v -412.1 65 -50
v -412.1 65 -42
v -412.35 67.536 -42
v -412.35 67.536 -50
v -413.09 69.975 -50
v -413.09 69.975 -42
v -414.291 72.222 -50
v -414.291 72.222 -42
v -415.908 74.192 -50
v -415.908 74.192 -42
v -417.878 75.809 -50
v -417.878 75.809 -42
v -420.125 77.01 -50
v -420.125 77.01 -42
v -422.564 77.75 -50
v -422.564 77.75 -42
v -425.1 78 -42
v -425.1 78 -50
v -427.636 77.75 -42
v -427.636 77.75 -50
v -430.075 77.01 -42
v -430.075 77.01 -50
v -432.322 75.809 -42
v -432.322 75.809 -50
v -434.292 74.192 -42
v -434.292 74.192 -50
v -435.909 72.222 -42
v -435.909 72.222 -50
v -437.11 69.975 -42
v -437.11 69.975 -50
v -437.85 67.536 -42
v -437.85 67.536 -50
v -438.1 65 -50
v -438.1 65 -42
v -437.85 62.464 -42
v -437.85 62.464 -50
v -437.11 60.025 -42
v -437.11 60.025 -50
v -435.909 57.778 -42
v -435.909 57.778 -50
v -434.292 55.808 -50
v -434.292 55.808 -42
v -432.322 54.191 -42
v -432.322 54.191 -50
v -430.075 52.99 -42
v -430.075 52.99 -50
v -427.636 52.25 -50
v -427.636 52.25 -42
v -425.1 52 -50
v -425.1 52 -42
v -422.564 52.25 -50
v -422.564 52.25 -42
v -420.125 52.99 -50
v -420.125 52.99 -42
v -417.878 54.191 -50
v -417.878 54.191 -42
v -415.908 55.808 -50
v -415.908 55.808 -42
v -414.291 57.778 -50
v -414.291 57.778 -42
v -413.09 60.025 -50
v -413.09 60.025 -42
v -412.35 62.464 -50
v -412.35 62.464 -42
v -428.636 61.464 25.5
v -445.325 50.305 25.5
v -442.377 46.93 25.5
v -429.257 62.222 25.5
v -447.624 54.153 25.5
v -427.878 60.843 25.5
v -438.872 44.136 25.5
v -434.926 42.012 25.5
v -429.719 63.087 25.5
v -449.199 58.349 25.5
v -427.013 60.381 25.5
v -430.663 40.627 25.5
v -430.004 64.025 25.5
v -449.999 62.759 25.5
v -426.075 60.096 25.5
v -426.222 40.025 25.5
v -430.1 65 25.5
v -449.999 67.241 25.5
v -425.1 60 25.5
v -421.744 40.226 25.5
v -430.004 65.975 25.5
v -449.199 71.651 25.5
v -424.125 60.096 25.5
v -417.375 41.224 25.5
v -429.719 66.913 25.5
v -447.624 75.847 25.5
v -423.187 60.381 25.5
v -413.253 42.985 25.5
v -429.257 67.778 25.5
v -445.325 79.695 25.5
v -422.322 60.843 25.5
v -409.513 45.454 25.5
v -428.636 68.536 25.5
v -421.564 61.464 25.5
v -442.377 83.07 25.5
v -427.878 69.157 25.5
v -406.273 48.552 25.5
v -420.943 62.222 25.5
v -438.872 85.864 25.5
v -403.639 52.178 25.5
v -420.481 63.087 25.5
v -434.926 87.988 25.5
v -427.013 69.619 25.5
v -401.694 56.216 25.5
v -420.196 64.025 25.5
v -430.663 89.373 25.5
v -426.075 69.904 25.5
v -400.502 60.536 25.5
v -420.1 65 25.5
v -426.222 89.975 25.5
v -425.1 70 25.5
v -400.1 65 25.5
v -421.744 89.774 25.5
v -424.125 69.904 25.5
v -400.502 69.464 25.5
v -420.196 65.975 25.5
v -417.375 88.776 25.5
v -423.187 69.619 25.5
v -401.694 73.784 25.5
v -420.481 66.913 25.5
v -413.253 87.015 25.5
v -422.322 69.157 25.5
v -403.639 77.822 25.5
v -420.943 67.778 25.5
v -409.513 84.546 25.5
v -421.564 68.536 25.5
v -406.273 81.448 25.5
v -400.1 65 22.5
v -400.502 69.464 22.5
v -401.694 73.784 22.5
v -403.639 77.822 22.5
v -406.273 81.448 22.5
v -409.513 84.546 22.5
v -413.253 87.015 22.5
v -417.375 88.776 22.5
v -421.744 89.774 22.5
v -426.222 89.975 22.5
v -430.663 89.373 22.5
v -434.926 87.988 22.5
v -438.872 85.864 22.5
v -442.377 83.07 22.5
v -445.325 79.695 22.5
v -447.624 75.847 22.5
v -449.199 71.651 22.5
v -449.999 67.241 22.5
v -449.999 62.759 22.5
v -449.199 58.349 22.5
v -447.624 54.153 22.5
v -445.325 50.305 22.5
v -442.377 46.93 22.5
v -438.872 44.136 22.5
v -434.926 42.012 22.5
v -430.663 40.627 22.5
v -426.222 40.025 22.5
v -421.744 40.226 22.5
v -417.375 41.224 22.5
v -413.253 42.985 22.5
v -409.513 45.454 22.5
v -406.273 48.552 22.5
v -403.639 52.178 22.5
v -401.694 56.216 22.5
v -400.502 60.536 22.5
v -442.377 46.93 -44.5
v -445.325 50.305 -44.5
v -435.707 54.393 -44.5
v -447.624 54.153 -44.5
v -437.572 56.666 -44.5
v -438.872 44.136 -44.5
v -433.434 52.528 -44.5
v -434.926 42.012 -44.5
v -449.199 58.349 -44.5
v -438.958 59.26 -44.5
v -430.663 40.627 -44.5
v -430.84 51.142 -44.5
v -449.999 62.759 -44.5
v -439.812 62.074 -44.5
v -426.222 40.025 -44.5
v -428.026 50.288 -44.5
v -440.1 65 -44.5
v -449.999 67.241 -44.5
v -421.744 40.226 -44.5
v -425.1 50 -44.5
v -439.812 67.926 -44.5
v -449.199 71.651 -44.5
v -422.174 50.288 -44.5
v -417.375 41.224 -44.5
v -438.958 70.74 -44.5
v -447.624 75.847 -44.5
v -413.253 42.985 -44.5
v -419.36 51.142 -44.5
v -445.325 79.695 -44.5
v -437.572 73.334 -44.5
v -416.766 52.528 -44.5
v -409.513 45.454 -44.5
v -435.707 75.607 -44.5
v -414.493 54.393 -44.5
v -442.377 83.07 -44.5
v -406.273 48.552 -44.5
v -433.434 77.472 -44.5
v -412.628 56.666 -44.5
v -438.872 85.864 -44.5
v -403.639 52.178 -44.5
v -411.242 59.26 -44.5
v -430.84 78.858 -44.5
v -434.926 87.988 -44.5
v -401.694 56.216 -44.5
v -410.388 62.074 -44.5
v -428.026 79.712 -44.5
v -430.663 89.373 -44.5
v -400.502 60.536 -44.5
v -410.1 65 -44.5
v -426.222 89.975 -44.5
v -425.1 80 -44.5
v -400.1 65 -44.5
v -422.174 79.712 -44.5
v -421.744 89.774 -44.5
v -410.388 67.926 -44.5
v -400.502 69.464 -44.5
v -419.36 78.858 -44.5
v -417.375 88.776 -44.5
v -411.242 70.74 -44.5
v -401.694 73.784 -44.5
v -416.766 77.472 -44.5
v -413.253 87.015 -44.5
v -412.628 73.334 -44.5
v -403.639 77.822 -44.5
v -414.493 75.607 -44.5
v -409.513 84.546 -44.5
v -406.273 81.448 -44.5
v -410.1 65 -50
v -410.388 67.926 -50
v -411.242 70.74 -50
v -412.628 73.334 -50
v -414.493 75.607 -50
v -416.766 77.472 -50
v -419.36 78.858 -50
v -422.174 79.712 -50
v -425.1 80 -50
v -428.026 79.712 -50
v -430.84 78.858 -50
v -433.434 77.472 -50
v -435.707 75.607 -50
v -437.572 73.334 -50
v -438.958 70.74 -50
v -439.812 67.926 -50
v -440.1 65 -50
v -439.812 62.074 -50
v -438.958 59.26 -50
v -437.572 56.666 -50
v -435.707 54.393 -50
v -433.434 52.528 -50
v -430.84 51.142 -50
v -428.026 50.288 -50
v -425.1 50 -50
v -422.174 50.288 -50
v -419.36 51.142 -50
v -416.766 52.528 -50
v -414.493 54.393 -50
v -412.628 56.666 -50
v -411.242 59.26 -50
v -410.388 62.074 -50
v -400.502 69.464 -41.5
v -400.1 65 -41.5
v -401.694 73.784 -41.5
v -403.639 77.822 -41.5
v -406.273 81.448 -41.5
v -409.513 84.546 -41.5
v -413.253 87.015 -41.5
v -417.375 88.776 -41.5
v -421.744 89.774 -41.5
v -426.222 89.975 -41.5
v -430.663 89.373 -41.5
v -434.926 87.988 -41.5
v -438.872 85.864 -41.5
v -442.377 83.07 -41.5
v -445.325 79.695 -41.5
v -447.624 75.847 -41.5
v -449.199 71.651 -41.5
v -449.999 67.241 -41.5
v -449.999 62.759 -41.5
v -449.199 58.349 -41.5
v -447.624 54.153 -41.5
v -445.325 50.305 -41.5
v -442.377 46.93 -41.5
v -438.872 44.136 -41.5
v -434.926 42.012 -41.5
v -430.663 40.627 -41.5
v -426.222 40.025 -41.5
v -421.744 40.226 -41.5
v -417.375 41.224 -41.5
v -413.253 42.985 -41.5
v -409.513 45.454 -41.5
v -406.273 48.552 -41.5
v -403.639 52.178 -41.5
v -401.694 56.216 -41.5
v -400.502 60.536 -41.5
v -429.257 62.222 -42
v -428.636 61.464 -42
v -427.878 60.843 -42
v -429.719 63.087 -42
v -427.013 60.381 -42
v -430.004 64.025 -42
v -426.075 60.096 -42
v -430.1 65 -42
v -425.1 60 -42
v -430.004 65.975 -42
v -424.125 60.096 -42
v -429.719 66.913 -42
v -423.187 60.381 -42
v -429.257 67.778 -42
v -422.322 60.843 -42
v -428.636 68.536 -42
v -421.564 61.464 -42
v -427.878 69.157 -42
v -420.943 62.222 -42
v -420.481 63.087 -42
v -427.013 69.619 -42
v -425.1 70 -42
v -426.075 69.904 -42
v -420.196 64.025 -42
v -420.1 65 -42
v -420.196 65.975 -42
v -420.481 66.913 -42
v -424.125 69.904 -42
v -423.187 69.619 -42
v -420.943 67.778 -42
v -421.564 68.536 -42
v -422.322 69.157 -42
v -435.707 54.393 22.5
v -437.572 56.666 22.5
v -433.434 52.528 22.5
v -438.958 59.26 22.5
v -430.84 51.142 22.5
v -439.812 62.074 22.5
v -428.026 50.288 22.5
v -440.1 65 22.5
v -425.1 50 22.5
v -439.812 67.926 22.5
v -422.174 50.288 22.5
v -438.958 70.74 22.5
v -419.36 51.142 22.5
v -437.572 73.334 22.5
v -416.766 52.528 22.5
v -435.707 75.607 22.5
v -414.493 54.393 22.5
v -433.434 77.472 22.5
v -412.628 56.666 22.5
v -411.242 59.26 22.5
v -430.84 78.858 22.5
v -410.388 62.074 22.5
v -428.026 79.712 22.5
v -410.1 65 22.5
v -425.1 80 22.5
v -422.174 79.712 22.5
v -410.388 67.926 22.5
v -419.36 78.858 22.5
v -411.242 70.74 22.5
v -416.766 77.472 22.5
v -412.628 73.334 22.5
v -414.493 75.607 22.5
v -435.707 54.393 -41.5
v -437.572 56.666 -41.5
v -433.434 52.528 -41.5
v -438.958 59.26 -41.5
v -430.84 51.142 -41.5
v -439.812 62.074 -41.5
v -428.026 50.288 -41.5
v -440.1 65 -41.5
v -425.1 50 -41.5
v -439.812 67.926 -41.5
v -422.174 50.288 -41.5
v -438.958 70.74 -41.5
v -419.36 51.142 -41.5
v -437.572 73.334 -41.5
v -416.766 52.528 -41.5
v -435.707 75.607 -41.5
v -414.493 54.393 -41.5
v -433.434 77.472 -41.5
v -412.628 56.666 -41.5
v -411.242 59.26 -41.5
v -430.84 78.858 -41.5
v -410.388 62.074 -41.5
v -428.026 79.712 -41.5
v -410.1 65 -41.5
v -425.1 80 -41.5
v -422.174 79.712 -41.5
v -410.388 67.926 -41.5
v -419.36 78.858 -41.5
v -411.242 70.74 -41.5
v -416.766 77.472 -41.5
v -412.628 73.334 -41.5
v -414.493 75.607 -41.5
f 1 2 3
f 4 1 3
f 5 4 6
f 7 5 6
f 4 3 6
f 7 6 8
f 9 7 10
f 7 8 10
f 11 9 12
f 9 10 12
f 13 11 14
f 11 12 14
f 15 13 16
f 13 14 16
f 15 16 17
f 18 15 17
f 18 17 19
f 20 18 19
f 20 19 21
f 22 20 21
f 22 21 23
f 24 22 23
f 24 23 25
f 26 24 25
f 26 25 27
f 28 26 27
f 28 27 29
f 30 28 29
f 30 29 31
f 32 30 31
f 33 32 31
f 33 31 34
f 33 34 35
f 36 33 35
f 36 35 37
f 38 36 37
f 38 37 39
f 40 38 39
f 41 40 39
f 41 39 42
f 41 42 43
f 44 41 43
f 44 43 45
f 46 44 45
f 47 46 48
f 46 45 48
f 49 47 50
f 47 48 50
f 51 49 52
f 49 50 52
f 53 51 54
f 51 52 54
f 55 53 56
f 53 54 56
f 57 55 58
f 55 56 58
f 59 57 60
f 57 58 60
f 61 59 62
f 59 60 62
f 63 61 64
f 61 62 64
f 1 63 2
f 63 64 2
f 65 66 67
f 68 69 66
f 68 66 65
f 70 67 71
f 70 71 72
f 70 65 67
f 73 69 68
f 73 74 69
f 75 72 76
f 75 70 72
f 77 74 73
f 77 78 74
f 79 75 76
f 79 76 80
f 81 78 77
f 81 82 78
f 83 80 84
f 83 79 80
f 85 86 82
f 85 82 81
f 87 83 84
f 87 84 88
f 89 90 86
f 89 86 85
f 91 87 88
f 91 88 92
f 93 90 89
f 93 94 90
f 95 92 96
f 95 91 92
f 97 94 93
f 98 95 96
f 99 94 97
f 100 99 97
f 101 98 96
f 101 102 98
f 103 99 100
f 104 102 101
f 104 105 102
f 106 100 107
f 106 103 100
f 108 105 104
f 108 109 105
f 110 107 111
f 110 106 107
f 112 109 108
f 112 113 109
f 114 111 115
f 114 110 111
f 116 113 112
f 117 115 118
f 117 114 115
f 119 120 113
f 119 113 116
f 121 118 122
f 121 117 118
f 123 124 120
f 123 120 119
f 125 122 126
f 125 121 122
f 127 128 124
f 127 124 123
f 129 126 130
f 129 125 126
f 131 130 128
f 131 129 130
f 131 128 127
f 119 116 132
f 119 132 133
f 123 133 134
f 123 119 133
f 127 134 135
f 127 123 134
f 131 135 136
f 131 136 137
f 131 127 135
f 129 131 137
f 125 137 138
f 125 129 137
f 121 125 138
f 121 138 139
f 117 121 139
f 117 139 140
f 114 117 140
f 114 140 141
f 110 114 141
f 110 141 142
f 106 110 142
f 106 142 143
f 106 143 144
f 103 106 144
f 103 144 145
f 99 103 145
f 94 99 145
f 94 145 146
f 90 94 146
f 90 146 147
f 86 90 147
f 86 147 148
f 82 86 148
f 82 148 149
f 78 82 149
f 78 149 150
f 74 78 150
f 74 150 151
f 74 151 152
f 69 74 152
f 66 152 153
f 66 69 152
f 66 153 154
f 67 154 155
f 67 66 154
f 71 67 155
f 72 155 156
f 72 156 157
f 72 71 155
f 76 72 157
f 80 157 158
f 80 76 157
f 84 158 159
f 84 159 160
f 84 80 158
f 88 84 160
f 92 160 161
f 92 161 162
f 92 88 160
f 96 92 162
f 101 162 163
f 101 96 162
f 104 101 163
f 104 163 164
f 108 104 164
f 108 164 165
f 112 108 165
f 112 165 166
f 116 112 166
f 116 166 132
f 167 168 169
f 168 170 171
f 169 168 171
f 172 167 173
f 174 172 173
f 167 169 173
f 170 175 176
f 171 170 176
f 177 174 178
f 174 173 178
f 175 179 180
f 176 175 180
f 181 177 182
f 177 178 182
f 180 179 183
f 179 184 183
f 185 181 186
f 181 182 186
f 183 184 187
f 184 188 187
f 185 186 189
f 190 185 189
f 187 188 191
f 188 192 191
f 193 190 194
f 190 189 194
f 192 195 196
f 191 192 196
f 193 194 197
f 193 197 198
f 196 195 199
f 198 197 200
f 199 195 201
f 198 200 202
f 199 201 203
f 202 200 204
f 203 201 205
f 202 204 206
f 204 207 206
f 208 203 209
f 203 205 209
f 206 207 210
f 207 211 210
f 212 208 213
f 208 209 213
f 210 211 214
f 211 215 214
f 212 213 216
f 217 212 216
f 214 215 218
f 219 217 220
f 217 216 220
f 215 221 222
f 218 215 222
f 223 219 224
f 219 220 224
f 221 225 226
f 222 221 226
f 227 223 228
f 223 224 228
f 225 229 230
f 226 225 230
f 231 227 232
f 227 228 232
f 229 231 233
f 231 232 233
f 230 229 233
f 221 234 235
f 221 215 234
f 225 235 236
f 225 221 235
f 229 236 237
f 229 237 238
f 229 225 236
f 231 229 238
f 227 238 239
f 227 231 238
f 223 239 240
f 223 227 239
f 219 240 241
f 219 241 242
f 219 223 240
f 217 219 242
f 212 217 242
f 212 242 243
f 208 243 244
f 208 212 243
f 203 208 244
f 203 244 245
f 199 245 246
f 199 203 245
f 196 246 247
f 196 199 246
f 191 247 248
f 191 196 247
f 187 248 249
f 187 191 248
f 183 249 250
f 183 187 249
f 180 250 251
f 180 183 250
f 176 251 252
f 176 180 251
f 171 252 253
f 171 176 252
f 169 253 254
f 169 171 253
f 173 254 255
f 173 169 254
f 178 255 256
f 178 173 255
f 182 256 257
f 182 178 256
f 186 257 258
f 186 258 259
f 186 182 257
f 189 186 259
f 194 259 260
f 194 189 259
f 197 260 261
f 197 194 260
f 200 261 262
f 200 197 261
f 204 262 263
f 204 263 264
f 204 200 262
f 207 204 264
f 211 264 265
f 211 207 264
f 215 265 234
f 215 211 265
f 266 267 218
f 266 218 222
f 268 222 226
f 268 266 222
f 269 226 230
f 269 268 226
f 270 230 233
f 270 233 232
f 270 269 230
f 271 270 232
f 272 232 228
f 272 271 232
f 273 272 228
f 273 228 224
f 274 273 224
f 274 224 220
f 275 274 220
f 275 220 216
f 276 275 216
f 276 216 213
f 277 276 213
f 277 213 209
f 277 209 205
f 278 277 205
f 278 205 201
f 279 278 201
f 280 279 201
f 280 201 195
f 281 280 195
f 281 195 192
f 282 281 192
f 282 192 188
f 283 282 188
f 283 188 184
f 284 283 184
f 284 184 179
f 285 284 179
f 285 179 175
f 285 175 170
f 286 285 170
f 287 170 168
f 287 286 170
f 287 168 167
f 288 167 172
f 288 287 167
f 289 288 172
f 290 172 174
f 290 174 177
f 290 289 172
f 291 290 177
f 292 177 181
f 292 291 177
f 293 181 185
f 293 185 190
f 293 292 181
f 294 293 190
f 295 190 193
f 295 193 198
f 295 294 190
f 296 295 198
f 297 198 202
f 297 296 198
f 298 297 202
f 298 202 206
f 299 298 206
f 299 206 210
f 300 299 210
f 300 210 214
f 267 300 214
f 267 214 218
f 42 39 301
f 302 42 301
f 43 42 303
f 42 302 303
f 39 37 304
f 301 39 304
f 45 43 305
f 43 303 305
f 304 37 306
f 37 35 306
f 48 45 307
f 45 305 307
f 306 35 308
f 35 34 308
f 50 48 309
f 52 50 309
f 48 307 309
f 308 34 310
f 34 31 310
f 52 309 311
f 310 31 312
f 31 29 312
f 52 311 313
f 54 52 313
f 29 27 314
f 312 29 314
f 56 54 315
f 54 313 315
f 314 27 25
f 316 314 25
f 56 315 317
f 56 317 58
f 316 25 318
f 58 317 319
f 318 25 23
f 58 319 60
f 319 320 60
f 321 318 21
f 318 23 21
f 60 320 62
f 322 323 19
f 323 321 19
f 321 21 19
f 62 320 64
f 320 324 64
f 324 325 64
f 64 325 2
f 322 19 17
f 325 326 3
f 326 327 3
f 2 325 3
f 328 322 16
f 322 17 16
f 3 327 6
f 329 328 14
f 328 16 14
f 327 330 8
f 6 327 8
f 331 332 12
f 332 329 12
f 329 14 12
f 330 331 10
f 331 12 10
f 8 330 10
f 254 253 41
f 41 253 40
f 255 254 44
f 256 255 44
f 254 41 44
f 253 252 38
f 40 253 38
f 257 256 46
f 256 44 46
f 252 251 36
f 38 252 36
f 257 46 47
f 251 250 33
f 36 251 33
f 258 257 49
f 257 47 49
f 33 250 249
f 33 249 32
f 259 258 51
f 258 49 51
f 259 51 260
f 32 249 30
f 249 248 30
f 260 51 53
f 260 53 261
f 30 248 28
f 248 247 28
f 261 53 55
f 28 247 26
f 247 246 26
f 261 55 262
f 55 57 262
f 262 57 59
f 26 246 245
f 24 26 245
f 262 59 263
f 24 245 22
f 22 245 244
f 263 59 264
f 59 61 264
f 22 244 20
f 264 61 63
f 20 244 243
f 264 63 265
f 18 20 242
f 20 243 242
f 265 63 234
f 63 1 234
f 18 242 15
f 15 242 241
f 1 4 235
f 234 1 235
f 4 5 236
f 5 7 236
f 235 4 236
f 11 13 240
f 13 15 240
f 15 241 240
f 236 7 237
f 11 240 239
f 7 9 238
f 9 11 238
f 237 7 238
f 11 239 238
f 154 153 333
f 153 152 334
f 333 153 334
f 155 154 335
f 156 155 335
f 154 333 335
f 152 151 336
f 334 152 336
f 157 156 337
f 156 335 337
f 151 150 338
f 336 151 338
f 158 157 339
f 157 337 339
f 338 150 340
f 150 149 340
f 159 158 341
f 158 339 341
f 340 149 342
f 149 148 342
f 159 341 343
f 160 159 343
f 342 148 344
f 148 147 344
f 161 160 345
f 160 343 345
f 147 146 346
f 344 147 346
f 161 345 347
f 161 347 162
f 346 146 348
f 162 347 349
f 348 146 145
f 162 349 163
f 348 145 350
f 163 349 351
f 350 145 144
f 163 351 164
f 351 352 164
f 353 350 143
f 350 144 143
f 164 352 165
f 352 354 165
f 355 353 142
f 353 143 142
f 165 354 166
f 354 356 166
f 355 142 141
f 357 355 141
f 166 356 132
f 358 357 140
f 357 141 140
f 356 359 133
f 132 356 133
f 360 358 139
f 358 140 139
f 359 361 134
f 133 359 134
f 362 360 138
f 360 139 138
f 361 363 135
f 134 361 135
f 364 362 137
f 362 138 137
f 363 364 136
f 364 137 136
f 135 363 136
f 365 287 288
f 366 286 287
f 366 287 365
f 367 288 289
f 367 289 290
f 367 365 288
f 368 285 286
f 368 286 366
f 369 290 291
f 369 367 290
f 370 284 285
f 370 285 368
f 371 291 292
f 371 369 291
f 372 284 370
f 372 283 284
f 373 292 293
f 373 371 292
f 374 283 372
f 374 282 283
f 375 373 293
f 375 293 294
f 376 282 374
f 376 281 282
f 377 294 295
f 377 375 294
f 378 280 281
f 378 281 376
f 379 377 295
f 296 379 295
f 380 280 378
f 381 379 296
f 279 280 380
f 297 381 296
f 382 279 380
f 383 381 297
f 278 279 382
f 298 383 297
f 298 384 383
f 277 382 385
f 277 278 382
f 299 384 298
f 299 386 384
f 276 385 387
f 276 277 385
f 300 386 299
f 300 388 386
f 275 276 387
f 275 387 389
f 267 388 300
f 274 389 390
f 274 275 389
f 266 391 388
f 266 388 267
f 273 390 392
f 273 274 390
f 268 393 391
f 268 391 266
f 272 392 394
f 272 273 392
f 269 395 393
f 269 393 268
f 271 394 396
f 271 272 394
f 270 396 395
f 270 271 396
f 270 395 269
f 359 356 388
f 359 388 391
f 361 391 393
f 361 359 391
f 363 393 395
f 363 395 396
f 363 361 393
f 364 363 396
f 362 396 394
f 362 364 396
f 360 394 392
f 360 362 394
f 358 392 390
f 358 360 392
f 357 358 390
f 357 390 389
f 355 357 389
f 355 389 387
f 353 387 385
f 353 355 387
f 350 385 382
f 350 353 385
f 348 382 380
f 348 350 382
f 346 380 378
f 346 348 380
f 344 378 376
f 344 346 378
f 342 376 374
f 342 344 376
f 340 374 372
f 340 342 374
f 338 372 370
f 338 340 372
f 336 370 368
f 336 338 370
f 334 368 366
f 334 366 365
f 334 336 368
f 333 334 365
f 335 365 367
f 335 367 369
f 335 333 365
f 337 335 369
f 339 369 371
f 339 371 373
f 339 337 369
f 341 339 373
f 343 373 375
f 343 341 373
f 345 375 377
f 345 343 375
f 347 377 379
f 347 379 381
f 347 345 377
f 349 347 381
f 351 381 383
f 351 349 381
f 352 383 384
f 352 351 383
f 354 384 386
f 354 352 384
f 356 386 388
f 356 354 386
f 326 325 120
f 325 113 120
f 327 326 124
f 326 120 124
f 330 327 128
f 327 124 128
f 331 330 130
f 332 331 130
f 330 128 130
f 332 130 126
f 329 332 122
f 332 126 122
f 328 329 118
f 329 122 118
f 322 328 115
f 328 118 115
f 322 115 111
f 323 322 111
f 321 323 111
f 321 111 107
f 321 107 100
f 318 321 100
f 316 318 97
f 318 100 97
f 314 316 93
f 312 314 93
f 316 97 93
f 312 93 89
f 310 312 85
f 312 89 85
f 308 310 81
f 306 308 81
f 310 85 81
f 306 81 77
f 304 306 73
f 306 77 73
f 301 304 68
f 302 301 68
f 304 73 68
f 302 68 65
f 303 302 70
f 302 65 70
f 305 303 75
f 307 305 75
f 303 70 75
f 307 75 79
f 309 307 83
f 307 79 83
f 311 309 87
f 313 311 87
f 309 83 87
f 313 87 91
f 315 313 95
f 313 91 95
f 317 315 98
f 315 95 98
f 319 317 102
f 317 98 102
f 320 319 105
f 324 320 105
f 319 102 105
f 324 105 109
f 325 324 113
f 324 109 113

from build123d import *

# Parameters (mm, degrees)
CUERPO_PROFILE_R                     = 15
BRIDA_IZQ_PROFILE_R                  = 25
BRIDA_DCHA_PROFILE_R                 = 25
TALADRO_EJE_PROFILE_R                = 5
ALOJAMIENTO_RODAMIENTO_IZQ_PROFILE_R = 13


with BuildPart() as part:
    # Cuerpo: sweep along a curve in space
    with BuildLine() as cuerpo_path:
        Line((-425.1, 65, -50), (-425.1, 65, 25.5))
    # Cuerpo profile (on start of the path) → Cuerpo (sweep)
    with BuildSketch(Plane(origin=(-425.1, 65, -50), x_dir=(1, 0, 0), z_dir=(0, 0, 1))):
        Circle(CUERPO_PROFILE_R)
    sweep(path=cuerpo_path.line)

    # Brida_izq: sweep along a curve in space
    with BuildLine() as brida_izq_path:
        Line((-425.1, 65, -44.5), (-425.1, 65, -41.5))
    # Brida_izq profile (on start of the path) → Brida_izq (sweep)
    with BuildSketch(Plane(origin=(-425.1, 65, -44.5), x_dir=(1, 0, 0), z_dir=(0, 0, 1))):
        Circle(BRIDA_IZQ_PROFILE_R)
    sweep(path=brida_izq_path.line)

    # Brida_dcha: sweep along a curve in space
    with BuildLine() as brida_dcha_path:
        Line((-425.1, 65, 22.5), (-425.1, 65, 25.5))
    # Brida_dcha profile (on start of the path) → Brida_dcha (sweep)
    with BuildSketch(Plane(origin=(-425.1, 65, 22.5), x_dir=(1, 0, 0), z_dir=(0, 0, 1))):
        Circle(BRIDA_DCHA_PROFILE_R)
    sweep(path=brida_dcha_path.line)

    # Taladro_eje: sweep along a curve in space
    with BuildLine() as taladro_eje_path:
        Line((-425.1, 65, -50), (-425.1, 65, 25.5))
    # Taladro_eje profile (on start of the path) → Taladro_eje (sweep, cut)
    with BuildSketch(Plane(origin=(-425.1, 65, -50), x_dir=(1, 0, 0), z_dir=(0, 0, 1))):
        Circle(TALADRO_EJE_PROFILE_R)
    sweep(path=taladro_eje_path.line, mode=Mode.SUBTRACT)

    # Alojamiento_rodamiento_izq: sweep along a curve in space
    with BuildLine() as alojamiento_rodamiento_izq_path:
        Line((-425.1, 65, -50), (-425.1, 65, -42))
    # Alojamiento_rodamiento_izq profile (on start of the path) → Alojamiento_rodamiento_izq (sweep, cut)
    with BuildSketch(Plane(origin=(-425.1, 65, -50), x_dir=(1, 0, 0), z_dir=(0, 0, 1))):
        Circle(ALOJAMIENTO_RODAMIENTO_IZQ_PROFILE_R)
    sweep(path=alojamiento_rodamiento_izq_path.line, mode=Mode.SUBTRACT)


solid = part.part
